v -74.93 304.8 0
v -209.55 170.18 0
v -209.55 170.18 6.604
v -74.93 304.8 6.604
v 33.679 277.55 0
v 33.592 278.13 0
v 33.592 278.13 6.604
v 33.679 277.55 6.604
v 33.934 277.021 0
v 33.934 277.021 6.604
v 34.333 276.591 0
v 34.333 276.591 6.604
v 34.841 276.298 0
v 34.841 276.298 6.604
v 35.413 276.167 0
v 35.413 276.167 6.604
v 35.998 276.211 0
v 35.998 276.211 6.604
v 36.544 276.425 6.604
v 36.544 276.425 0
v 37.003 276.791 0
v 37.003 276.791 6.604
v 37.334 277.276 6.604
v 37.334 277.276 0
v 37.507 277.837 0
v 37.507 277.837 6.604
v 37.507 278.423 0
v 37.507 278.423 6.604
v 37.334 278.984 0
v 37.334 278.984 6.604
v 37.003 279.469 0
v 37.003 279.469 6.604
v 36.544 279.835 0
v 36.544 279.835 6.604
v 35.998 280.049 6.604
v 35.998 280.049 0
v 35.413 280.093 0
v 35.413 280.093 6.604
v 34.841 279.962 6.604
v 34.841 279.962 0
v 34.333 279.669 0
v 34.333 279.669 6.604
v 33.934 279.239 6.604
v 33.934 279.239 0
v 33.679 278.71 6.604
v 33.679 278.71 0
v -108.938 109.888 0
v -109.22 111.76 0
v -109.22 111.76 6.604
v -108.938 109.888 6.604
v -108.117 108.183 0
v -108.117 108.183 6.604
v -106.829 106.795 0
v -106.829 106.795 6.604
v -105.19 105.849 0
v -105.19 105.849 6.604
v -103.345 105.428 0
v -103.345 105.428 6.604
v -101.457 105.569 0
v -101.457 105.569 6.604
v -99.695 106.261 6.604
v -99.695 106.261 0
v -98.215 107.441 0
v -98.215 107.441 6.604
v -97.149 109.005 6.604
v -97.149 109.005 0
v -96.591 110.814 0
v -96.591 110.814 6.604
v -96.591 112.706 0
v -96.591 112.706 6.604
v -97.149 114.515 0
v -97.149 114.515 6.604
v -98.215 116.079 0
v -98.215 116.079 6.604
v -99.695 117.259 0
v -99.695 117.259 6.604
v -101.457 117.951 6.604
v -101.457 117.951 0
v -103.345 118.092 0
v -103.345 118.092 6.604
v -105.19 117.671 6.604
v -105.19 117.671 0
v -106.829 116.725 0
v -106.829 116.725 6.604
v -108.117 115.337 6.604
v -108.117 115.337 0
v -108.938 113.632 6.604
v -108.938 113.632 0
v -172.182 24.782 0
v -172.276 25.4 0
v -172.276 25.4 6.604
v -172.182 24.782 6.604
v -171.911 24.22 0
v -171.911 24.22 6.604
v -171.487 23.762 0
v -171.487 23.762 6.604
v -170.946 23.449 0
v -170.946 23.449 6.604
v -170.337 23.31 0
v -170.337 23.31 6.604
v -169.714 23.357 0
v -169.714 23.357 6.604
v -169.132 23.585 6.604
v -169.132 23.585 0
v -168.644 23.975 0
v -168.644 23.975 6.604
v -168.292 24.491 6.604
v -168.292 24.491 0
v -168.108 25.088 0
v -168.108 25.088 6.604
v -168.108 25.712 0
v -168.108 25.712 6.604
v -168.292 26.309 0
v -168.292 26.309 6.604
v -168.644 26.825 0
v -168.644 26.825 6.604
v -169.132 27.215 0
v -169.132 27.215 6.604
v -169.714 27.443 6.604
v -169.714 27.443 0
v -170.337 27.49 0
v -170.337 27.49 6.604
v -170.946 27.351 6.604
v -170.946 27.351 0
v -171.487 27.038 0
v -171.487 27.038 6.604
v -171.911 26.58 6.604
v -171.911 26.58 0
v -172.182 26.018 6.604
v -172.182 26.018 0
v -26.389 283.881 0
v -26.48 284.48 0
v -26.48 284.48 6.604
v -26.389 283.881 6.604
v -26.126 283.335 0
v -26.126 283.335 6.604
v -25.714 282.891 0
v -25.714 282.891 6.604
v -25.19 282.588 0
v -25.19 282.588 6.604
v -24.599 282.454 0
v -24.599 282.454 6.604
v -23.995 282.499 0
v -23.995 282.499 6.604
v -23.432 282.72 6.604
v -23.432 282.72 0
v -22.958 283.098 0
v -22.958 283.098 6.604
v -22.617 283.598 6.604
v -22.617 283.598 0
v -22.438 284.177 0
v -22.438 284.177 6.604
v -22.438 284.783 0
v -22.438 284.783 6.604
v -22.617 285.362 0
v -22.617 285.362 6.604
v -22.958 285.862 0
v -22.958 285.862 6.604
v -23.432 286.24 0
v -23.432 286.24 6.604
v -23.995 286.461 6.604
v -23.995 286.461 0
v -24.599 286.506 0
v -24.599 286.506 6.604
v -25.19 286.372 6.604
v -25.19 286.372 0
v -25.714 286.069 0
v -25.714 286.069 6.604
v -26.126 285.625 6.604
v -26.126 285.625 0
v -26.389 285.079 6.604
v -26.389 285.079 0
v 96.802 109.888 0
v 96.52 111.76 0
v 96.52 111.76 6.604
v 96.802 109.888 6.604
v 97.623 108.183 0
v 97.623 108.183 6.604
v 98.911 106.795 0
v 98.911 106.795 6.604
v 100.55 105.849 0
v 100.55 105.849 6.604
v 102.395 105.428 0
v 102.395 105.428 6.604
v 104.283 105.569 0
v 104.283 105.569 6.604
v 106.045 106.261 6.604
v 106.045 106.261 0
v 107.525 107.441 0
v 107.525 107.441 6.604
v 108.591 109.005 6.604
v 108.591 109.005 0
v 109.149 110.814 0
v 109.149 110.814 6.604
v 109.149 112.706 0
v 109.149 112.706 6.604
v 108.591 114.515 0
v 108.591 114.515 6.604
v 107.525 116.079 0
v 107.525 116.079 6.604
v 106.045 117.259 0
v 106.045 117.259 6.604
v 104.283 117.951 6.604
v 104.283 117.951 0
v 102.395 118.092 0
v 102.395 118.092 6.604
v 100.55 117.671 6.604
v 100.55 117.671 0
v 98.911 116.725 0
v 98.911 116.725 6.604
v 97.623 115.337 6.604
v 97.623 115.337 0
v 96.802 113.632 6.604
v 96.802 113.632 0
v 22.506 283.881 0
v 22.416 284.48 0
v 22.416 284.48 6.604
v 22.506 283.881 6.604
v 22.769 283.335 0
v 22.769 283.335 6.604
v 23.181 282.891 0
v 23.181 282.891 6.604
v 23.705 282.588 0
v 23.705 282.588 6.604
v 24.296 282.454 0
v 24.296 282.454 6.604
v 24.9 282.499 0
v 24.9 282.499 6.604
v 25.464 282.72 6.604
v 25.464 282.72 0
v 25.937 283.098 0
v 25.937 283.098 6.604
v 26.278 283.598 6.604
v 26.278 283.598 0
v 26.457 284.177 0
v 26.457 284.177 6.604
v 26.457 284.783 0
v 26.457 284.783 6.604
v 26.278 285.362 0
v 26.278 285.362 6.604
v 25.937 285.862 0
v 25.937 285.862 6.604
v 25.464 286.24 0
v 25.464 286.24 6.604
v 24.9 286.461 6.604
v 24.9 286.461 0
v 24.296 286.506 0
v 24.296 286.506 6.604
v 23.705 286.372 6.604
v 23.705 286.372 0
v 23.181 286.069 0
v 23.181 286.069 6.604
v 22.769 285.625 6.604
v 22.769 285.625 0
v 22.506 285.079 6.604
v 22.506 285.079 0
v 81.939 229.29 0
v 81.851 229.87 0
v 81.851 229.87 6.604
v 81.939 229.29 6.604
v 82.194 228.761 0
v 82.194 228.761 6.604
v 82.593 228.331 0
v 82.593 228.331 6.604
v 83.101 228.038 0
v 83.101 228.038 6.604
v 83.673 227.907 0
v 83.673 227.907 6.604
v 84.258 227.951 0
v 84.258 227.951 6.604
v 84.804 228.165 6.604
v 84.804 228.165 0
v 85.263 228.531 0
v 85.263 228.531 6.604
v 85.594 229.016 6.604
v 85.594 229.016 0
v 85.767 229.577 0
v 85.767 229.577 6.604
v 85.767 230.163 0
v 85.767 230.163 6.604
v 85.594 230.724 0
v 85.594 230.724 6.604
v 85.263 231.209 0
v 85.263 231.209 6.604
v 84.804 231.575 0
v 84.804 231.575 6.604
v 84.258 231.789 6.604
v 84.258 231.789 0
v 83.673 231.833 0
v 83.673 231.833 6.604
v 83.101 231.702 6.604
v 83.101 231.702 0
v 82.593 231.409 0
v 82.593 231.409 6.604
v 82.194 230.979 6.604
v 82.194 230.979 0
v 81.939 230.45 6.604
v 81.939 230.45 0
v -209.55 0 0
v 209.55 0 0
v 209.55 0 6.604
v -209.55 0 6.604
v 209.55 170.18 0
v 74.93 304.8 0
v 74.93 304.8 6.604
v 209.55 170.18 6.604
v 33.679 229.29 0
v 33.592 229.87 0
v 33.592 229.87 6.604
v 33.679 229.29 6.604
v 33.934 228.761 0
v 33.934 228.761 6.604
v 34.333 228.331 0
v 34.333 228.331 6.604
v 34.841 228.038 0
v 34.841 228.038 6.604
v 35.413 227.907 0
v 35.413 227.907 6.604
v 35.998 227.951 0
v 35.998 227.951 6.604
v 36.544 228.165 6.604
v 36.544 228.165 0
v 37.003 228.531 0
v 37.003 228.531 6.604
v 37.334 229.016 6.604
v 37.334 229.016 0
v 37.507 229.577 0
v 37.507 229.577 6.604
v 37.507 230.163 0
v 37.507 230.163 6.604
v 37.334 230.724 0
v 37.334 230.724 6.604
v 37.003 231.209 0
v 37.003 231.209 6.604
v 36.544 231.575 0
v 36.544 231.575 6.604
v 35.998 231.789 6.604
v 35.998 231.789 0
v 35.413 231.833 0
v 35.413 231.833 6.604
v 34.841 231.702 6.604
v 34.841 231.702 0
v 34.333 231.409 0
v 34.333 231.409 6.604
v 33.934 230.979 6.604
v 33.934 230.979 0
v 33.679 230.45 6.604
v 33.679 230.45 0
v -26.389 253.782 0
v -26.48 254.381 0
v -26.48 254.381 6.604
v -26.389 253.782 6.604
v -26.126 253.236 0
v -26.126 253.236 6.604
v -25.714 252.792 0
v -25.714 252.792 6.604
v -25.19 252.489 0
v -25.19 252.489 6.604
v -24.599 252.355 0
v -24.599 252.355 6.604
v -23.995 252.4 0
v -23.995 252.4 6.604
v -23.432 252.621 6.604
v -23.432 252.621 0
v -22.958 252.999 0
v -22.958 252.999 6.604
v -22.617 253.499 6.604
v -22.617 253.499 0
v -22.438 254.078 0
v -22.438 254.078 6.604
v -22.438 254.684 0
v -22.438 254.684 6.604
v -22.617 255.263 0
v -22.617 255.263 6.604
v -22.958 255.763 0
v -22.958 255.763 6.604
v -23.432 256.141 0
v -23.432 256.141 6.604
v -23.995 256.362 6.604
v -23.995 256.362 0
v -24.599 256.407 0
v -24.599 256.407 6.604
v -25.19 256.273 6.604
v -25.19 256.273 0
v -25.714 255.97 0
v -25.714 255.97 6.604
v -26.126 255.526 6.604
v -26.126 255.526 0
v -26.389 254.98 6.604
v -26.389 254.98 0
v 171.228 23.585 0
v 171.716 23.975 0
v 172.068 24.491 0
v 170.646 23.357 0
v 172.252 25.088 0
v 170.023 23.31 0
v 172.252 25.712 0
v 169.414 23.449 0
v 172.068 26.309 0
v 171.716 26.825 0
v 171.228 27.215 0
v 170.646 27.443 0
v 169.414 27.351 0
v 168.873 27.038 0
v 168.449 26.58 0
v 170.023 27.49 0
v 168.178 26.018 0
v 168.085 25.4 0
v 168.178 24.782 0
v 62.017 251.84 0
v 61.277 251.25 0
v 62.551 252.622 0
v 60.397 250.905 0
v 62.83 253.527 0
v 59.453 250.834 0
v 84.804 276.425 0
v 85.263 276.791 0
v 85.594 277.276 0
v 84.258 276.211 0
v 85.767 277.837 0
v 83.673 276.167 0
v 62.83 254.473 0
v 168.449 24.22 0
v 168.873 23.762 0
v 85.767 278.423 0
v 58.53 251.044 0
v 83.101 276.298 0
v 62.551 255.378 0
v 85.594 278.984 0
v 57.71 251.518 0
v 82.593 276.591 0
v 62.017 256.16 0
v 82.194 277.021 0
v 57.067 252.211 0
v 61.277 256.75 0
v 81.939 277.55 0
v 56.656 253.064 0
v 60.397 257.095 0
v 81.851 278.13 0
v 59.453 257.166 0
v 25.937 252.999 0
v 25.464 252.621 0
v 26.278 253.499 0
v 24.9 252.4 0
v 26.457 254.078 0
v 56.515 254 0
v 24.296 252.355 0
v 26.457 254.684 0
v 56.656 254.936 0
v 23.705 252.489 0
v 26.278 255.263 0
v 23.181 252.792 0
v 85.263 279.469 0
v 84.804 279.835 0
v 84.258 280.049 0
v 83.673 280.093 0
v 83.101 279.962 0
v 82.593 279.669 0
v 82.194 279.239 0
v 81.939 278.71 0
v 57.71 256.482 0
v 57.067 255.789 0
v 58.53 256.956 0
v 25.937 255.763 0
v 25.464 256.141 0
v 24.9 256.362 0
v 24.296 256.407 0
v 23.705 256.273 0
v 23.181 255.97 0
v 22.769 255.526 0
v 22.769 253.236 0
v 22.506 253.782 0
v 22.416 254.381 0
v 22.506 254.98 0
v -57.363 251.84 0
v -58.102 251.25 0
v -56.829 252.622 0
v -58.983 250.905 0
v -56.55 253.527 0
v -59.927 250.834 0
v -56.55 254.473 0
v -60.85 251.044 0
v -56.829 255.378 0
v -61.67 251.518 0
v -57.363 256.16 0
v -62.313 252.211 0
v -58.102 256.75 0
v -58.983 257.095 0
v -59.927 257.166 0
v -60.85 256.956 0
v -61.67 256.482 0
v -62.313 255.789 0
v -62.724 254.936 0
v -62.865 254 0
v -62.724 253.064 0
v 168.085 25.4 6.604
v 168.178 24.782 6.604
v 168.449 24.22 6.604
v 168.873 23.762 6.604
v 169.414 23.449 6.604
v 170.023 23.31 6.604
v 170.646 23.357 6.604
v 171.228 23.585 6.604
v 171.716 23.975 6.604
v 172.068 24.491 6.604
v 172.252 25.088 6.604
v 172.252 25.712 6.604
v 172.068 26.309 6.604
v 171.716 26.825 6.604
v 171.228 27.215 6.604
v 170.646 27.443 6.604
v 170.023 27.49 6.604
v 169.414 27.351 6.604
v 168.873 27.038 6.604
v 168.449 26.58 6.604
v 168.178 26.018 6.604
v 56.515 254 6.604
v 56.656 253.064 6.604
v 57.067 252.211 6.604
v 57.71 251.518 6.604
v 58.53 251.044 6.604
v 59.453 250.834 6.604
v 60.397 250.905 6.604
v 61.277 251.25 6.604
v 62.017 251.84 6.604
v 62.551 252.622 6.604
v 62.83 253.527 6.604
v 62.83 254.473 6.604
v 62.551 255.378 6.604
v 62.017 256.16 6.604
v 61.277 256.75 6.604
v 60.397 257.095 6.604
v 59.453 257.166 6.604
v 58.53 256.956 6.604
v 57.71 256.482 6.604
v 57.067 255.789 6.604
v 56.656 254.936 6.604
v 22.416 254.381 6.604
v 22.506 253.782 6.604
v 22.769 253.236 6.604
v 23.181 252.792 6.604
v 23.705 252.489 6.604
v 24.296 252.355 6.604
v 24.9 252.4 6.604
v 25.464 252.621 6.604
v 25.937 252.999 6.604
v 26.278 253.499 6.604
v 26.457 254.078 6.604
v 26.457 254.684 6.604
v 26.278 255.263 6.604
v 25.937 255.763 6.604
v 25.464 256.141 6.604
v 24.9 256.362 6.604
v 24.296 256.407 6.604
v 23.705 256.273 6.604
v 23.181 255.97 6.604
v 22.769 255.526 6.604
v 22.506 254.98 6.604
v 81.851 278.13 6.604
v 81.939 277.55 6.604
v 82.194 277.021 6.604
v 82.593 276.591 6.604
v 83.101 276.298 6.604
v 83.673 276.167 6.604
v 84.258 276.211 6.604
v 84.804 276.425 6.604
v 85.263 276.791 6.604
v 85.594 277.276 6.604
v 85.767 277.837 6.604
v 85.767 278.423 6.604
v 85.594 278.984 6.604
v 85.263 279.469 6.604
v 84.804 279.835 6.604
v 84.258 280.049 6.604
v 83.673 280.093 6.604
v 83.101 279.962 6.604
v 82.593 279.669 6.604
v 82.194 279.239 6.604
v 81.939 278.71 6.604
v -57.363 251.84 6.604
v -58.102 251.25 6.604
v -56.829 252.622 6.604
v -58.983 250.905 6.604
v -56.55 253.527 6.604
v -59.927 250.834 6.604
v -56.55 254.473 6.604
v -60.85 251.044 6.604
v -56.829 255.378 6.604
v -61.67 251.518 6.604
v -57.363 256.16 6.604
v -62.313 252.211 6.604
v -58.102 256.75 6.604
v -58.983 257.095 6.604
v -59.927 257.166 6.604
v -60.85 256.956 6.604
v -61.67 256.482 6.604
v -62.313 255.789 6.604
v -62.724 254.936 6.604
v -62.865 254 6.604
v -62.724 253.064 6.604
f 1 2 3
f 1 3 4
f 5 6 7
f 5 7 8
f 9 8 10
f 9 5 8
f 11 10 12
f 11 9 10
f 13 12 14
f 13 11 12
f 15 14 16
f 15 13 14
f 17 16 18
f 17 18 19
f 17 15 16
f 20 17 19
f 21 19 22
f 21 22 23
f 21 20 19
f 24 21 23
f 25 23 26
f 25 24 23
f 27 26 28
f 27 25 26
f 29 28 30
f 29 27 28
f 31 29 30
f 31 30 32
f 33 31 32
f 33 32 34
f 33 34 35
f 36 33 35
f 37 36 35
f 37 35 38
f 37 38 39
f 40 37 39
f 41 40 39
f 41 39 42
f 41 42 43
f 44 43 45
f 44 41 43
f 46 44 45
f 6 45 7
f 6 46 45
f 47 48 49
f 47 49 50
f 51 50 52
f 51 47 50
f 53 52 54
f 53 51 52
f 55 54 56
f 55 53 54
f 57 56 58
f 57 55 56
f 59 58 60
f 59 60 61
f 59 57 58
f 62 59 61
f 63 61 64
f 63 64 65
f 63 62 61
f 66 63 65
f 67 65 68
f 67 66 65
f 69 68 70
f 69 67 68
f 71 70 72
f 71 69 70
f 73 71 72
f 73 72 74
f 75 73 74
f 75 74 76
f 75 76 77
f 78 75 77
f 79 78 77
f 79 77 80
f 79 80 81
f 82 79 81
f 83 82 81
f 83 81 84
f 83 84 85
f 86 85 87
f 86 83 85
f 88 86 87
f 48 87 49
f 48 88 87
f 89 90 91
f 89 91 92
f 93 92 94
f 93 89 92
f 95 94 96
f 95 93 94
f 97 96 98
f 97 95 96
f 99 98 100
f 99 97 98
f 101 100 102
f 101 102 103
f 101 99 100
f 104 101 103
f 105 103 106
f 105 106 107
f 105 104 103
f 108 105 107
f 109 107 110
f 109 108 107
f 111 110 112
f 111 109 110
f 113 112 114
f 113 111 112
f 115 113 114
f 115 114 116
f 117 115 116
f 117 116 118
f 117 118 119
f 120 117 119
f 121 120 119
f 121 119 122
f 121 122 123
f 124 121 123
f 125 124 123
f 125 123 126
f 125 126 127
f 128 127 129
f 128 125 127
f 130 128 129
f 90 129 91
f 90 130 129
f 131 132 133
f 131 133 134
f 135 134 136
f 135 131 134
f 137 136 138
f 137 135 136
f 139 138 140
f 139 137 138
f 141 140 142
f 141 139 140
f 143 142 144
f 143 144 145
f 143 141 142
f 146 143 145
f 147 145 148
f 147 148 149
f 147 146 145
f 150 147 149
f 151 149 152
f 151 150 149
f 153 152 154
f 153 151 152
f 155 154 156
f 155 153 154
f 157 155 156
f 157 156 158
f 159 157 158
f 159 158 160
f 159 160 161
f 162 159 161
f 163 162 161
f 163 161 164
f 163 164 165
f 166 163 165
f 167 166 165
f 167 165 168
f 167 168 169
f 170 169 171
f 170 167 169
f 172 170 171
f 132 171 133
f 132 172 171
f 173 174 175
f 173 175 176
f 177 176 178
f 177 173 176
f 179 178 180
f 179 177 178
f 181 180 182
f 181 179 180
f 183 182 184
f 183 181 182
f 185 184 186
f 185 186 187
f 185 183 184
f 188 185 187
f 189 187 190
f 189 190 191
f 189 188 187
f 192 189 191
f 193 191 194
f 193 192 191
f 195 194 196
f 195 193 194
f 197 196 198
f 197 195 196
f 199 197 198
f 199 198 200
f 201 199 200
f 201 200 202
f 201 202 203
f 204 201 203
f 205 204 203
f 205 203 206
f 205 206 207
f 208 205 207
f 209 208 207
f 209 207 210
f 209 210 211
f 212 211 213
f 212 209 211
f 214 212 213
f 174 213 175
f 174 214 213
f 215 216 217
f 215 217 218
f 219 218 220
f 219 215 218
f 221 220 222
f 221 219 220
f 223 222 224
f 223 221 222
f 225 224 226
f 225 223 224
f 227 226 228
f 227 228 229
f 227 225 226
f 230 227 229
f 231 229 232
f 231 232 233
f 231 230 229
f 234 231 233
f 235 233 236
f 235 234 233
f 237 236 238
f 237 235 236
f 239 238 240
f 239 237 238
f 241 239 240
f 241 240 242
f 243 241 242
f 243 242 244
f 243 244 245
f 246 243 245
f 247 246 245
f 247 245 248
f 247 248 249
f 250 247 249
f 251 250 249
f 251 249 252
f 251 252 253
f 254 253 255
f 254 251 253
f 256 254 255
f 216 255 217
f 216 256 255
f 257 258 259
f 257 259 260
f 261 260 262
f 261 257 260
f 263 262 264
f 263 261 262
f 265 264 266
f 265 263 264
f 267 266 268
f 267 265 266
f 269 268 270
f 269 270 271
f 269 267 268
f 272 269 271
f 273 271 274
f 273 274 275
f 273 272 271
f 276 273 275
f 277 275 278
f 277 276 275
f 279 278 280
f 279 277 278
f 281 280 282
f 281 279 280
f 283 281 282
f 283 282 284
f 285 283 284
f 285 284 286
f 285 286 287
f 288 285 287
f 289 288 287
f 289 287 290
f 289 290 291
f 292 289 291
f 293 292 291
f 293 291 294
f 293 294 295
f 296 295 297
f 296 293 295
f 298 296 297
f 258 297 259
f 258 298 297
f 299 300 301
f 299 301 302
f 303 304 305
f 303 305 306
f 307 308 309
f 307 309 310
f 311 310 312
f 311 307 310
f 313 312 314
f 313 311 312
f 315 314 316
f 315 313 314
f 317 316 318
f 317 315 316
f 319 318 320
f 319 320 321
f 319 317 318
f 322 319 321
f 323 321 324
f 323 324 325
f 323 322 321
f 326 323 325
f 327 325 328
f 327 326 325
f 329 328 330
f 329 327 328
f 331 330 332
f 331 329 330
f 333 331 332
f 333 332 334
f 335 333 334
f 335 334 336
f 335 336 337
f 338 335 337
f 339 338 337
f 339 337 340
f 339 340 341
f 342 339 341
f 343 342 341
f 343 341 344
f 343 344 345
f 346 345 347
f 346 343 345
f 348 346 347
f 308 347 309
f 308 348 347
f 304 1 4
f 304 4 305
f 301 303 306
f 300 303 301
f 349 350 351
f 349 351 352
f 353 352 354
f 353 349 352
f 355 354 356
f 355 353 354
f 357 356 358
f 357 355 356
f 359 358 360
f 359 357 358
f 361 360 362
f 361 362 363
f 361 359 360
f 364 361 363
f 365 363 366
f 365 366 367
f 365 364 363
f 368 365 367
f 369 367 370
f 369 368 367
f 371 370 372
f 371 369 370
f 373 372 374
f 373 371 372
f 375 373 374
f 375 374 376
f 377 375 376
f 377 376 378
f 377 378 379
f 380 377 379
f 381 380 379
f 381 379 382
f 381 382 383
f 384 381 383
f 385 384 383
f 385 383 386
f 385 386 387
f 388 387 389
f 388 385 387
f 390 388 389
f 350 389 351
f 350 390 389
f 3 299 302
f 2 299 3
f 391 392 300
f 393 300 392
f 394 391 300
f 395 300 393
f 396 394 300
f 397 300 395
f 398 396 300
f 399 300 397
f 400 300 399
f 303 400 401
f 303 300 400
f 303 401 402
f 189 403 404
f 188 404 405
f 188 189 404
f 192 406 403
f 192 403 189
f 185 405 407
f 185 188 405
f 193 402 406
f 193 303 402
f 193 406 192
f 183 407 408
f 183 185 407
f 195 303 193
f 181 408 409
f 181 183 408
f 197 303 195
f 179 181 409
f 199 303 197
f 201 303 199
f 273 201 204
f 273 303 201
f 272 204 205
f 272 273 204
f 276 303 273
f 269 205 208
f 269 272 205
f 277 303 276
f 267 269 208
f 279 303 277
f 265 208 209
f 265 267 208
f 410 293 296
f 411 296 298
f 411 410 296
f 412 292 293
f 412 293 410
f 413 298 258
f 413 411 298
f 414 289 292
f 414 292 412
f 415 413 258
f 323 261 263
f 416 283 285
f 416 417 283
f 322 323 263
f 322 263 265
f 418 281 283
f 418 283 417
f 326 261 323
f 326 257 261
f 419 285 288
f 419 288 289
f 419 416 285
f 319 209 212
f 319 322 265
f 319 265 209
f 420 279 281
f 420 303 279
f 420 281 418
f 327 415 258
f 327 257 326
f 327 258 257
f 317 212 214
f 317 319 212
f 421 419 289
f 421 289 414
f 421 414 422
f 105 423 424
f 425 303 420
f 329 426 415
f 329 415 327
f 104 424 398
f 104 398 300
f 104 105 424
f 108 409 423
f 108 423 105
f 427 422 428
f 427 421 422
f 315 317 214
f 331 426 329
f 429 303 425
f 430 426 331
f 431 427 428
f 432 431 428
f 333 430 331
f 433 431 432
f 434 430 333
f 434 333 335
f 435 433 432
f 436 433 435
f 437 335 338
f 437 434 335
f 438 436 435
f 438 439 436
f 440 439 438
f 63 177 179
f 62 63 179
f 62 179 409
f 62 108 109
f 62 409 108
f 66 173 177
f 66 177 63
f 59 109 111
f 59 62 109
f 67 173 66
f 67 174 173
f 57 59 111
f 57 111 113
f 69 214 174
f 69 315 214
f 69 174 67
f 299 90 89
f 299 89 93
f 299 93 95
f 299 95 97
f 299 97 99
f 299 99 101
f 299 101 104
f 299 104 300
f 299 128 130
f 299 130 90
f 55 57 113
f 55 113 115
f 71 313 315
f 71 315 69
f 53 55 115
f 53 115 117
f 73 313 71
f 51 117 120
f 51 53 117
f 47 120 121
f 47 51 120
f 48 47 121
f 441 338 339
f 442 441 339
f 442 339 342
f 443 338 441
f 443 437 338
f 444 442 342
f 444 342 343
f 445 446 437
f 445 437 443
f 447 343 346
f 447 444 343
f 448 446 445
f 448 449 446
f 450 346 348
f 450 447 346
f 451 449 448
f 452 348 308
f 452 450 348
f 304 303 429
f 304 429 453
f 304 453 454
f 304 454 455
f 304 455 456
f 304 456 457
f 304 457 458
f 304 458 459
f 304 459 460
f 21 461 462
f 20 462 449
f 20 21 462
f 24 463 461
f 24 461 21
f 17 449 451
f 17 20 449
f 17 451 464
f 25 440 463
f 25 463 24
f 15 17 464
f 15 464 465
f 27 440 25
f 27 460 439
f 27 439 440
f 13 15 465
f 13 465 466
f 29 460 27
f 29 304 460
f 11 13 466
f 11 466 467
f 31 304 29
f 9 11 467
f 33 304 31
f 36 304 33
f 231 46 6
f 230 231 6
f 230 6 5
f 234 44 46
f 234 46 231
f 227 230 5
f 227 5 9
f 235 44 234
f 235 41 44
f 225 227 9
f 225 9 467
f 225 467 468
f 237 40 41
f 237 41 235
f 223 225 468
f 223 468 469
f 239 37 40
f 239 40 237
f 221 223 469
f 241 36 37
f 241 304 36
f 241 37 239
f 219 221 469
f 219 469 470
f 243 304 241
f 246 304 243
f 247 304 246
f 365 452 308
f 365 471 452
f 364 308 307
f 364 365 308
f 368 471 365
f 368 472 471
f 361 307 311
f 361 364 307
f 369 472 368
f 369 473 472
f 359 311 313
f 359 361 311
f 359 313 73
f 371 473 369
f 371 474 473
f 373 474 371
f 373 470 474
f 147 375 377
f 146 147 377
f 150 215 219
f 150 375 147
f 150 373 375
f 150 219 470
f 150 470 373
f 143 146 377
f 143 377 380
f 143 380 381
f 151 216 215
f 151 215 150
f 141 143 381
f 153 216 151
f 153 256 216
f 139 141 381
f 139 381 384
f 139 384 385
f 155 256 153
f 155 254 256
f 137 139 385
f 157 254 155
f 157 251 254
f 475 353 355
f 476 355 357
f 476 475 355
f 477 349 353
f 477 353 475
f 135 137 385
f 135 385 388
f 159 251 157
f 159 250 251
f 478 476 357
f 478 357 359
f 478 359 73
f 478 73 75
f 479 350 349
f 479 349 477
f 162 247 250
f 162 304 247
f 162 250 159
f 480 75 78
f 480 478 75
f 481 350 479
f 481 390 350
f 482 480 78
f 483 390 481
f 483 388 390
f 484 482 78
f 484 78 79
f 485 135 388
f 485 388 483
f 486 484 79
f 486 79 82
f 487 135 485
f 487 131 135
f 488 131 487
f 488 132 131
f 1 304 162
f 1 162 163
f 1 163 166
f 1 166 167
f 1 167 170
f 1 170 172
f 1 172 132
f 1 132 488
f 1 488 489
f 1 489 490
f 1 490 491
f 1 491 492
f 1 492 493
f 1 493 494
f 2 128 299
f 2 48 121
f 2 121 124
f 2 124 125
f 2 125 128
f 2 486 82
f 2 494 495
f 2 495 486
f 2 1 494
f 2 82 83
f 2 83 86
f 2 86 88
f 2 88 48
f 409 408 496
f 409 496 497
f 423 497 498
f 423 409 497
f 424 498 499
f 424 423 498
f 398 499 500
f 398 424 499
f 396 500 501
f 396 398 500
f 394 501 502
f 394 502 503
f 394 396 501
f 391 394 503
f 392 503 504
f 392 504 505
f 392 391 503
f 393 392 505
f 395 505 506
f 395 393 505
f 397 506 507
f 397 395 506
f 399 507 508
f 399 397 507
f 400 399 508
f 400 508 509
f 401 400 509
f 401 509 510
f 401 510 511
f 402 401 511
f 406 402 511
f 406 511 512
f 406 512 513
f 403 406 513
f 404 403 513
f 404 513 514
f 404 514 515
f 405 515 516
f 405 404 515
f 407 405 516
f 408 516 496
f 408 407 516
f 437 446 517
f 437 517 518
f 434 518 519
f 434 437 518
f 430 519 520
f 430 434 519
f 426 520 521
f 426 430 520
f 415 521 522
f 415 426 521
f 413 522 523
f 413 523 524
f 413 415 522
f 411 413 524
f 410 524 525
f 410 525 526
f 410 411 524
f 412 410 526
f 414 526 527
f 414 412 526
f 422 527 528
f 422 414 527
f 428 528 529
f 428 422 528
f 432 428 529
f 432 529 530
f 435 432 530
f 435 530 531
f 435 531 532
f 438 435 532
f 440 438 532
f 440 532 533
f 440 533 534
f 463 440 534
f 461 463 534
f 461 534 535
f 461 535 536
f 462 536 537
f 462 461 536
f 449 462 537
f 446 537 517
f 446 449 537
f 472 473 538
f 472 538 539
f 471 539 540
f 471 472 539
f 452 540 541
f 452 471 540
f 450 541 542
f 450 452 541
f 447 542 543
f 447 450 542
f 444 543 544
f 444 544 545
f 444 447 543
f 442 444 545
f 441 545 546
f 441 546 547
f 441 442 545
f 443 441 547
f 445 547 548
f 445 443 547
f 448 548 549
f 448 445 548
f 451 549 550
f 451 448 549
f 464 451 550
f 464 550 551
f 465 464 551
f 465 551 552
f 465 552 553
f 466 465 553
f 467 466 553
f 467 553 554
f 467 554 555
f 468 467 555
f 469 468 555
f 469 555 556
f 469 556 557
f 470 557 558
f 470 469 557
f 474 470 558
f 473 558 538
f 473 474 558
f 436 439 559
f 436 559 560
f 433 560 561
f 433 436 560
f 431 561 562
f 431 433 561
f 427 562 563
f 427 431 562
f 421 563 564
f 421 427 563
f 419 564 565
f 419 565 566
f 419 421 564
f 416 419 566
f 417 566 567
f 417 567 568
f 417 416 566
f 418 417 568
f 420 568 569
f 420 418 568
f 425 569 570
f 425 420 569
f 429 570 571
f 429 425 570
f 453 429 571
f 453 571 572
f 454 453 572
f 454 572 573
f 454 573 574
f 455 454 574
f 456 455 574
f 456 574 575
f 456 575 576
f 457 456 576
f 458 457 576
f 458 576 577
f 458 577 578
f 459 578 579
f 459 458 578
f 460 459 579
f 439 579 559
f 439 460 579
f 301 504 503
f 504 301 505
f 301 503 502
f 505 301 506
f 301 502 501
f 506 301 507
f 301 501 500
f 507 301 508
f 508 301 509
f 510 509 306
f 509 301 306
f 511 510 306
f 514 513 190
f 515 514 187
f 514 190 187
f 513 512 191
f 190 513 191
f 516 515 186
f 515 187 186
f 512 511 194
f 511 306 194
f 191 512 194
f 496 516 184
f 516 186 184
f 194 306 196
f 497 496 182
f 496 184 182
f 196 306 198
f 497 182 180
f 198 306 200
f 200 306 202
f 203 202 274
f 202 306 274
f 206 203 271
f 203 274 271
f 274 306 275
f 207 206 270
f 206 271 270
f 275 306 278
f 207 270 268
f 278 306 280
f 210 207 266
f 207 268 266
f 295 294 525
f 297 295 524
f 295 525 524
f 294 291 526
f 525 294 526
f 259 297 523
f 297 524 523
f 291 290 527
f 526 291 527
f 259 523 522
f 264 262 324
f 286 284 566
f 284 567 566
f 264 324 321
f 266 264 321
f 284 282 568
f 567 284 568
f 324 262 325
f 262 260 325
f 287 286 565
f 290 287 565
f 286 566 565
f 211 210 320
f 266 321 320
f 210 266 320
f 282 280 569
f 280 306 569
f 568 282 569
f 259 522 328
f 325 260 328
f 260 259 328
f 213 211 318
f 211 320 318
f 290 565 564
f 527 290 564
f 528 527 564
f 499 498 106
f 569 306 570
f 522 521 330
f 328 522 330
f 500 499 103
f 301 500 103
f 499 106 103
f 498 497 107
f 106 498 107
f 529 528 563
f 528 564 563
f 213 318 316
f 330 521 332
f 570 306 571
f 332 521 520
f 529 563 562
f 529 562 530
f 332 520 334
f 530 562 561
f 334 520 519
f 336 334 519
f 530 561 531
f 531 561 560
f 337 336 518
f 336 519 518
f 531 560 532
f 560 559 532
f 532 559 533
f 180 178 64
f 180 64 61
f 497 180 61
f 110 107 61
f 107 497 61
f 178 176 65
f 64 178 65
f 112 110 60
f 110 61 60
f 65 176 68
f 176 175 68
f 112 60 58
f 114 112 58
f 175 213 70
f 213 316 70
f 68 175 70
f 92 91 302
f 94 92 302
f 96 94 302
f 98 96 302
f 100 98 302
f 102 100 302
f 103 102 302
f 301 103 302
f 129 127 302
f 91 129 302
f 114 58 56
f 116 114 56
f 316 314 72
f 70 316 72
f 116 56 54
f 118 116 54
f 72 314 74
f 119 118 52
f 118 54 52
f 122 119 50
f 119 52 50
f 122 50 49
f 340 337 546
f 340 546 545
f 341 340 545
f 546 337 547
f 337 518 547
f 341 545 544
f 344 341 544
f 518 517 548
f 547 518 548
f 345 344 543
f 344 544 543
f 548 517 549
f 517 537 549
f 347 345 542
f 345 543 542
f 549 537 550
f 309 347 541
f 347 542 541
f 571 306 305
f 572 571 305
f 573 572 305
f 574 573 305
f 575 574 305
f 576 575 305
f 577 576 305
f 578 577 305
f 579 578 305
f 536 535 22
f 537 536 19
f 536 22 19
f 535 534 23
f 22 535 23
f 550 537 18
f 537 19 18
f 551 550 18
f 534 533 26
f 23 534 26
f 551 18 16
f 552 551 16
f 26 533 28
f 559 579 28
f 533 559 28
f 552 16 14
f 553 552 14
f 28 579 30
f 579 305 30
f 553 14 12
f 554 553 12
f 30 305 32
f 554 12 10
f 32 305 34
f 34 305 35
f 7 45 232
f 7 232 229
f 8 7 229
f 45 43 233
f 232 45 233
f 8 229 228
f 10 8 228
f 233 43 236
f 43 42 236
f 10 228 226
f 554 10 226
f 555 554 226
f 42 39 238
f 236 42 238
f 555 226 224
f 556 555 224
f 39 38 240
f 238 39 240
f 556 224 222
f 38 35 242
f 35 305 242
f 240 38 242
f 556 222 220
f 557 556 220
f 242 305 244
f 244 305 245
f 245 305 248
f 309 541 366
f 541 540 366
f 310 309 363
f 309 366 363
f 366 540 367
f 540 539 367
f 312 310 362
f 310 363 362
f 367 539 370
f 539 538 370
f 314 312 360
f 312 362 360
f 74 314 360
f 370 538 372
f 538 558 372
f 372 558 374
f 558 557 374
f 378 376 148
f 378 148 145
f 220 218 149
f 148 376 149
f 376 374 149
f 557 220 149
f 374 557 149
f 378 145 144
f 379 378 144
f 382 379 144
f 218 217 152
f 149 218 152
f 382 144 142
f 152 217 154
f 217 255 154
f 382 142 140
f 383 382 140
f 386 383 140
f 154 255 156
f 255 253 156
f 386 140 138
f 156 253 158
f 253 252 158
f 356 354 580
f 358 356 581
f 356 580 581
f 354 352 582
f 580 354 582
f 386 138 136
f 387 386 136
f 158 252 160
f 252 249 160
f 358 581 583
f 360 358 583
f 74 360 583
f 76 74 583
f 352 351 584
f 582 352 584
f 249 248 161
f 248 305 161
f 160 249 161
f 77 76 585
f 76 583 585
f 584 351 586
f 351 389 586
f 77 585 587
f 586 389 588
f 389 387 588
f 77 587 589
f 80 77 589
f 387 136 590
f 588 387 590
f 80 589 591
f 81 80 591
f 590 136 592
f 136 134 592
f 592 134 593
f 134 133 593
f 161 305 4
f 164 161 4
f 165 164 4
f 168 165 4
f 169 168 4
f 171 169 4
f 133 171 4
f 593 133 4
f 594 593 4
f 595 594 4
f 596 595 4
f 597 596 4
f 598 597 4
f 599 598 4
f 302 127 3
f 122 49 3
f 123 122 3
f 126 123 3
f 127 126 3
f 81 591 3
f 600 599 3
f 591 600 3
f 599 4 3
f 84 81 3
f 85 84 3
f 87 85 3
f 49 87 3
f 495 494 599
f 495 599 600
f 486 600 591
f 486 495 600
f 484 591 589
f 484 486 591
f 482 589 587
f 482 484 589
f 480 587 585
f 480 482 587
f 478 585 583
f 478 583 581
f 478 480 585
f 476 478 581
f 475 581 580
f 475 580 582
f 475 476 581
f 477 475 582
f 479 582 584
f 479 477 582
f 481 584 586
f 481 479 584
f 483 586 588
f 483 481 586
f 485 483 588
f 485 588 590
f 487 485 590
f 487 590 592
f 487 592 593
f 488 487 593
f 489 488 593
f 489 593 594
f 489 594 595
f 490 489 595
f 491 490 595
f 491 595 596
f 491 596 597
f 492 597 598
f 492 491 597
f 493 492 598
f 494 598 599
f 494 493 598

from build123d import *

# Parameters (mm, degrees)
REFERENCE_R         = 6.35
REFERENCE_R_2       = 3.175
REFERENCE_R_3       = 2.0955
REFERENCE_R_4       = 1.9685
REFERENCE_R_5       = 2.032
BOSS_EXTRUDE3_DEPTH = 6.604


with BuildPart() as part:
    # reference → Boss-Extrude3 (new body)
    with BuildSketch(Plane.XY):
        Polygon((209.55, 0), (-209.55, 0), (-209.55, 170.18), (-74.93, 304.8), (74.93, 304.8), (209.55, 170.18), align=None)
        with Locations(Location((-102.87, 111.76, 0), (0, 0, 180))):
            Circle(REFERENCE_R, mode=Mode.SUBTRACT)
        with Locations(Location((102.87, 111.76, 0), (0, 0, 180))):
            Circle(REFERENCE_R, mode=Mode.SUBTRACT)
        with Locations(Location((-59.69, 254, 0), (0, 0, 180))):
            Circle(REFERENCE_R_2, mode=Mode.SUBTRACT)
        with Locations(Location((59.69, 254, 0), (0, 0, 180))):
            Circle(REFERENCE_R_2, mode=Mode.SUBTRACT)
        with Locations(Location((170.18, 25.4, 0), (0, 0, 180))):
            Circle(REFERENCE_R_3, mode=Mode.SUBTRACT)
        with Locations(Location((-170.18, 25.4, 0), (0, 0, 180))):
            Circle(REFERENCE_R_3, mode=Mode.SUBTRACT)
        with Locations(Location((83.82, 229.87, 0), (0, 0, 180))):
            Circle(REFERENCE_R_4, mode=Mode.SUBTRACT)
        with Locations(Location((35.56, 229.87, 0), (0, 0, 180))):
            Circle(REFERENCE_R_4, mode=Mode.SUBTRACT)
        with Locations(Location((83.82, 278.13, 0), (0, 0, 180))):
            Circle(REFERENCE_R_4, mode=Mode.SUBTRACT)
        with Locations(Location((35.56, 278.13, 0), (0, 0, 180))):
            Circle(REFERENCE_R_4, mode=Mode.SUBTRACT)
        with Locations(Location((24.4475, 284.48, 0), (0, 0, 180))):
            Circle(REFERENCE_R_5, mode=Mode.SUBTRACT)
        with Locations(Location((24.4475, 254.381, 0), (0, 0, 180))):
            Circle(REFERENCE_R_5, mode=Mode.SUBTRACT)
        with Locations(Location((-24.4475, 254.381, 0), (0, 0, 180))):
            Circle(REFERENCE_R_5, mode=Mode.SUBTRACT)
        with Locations(Location((-24.4475, 284.48, 0), (0, 0, 180))):
            Circle(REFERENCE_R_5, mode=Mode.SUBTRACT)
    extrude(amount=BOSS_EXTRUDE3_DEPTH)


solid = part.part
